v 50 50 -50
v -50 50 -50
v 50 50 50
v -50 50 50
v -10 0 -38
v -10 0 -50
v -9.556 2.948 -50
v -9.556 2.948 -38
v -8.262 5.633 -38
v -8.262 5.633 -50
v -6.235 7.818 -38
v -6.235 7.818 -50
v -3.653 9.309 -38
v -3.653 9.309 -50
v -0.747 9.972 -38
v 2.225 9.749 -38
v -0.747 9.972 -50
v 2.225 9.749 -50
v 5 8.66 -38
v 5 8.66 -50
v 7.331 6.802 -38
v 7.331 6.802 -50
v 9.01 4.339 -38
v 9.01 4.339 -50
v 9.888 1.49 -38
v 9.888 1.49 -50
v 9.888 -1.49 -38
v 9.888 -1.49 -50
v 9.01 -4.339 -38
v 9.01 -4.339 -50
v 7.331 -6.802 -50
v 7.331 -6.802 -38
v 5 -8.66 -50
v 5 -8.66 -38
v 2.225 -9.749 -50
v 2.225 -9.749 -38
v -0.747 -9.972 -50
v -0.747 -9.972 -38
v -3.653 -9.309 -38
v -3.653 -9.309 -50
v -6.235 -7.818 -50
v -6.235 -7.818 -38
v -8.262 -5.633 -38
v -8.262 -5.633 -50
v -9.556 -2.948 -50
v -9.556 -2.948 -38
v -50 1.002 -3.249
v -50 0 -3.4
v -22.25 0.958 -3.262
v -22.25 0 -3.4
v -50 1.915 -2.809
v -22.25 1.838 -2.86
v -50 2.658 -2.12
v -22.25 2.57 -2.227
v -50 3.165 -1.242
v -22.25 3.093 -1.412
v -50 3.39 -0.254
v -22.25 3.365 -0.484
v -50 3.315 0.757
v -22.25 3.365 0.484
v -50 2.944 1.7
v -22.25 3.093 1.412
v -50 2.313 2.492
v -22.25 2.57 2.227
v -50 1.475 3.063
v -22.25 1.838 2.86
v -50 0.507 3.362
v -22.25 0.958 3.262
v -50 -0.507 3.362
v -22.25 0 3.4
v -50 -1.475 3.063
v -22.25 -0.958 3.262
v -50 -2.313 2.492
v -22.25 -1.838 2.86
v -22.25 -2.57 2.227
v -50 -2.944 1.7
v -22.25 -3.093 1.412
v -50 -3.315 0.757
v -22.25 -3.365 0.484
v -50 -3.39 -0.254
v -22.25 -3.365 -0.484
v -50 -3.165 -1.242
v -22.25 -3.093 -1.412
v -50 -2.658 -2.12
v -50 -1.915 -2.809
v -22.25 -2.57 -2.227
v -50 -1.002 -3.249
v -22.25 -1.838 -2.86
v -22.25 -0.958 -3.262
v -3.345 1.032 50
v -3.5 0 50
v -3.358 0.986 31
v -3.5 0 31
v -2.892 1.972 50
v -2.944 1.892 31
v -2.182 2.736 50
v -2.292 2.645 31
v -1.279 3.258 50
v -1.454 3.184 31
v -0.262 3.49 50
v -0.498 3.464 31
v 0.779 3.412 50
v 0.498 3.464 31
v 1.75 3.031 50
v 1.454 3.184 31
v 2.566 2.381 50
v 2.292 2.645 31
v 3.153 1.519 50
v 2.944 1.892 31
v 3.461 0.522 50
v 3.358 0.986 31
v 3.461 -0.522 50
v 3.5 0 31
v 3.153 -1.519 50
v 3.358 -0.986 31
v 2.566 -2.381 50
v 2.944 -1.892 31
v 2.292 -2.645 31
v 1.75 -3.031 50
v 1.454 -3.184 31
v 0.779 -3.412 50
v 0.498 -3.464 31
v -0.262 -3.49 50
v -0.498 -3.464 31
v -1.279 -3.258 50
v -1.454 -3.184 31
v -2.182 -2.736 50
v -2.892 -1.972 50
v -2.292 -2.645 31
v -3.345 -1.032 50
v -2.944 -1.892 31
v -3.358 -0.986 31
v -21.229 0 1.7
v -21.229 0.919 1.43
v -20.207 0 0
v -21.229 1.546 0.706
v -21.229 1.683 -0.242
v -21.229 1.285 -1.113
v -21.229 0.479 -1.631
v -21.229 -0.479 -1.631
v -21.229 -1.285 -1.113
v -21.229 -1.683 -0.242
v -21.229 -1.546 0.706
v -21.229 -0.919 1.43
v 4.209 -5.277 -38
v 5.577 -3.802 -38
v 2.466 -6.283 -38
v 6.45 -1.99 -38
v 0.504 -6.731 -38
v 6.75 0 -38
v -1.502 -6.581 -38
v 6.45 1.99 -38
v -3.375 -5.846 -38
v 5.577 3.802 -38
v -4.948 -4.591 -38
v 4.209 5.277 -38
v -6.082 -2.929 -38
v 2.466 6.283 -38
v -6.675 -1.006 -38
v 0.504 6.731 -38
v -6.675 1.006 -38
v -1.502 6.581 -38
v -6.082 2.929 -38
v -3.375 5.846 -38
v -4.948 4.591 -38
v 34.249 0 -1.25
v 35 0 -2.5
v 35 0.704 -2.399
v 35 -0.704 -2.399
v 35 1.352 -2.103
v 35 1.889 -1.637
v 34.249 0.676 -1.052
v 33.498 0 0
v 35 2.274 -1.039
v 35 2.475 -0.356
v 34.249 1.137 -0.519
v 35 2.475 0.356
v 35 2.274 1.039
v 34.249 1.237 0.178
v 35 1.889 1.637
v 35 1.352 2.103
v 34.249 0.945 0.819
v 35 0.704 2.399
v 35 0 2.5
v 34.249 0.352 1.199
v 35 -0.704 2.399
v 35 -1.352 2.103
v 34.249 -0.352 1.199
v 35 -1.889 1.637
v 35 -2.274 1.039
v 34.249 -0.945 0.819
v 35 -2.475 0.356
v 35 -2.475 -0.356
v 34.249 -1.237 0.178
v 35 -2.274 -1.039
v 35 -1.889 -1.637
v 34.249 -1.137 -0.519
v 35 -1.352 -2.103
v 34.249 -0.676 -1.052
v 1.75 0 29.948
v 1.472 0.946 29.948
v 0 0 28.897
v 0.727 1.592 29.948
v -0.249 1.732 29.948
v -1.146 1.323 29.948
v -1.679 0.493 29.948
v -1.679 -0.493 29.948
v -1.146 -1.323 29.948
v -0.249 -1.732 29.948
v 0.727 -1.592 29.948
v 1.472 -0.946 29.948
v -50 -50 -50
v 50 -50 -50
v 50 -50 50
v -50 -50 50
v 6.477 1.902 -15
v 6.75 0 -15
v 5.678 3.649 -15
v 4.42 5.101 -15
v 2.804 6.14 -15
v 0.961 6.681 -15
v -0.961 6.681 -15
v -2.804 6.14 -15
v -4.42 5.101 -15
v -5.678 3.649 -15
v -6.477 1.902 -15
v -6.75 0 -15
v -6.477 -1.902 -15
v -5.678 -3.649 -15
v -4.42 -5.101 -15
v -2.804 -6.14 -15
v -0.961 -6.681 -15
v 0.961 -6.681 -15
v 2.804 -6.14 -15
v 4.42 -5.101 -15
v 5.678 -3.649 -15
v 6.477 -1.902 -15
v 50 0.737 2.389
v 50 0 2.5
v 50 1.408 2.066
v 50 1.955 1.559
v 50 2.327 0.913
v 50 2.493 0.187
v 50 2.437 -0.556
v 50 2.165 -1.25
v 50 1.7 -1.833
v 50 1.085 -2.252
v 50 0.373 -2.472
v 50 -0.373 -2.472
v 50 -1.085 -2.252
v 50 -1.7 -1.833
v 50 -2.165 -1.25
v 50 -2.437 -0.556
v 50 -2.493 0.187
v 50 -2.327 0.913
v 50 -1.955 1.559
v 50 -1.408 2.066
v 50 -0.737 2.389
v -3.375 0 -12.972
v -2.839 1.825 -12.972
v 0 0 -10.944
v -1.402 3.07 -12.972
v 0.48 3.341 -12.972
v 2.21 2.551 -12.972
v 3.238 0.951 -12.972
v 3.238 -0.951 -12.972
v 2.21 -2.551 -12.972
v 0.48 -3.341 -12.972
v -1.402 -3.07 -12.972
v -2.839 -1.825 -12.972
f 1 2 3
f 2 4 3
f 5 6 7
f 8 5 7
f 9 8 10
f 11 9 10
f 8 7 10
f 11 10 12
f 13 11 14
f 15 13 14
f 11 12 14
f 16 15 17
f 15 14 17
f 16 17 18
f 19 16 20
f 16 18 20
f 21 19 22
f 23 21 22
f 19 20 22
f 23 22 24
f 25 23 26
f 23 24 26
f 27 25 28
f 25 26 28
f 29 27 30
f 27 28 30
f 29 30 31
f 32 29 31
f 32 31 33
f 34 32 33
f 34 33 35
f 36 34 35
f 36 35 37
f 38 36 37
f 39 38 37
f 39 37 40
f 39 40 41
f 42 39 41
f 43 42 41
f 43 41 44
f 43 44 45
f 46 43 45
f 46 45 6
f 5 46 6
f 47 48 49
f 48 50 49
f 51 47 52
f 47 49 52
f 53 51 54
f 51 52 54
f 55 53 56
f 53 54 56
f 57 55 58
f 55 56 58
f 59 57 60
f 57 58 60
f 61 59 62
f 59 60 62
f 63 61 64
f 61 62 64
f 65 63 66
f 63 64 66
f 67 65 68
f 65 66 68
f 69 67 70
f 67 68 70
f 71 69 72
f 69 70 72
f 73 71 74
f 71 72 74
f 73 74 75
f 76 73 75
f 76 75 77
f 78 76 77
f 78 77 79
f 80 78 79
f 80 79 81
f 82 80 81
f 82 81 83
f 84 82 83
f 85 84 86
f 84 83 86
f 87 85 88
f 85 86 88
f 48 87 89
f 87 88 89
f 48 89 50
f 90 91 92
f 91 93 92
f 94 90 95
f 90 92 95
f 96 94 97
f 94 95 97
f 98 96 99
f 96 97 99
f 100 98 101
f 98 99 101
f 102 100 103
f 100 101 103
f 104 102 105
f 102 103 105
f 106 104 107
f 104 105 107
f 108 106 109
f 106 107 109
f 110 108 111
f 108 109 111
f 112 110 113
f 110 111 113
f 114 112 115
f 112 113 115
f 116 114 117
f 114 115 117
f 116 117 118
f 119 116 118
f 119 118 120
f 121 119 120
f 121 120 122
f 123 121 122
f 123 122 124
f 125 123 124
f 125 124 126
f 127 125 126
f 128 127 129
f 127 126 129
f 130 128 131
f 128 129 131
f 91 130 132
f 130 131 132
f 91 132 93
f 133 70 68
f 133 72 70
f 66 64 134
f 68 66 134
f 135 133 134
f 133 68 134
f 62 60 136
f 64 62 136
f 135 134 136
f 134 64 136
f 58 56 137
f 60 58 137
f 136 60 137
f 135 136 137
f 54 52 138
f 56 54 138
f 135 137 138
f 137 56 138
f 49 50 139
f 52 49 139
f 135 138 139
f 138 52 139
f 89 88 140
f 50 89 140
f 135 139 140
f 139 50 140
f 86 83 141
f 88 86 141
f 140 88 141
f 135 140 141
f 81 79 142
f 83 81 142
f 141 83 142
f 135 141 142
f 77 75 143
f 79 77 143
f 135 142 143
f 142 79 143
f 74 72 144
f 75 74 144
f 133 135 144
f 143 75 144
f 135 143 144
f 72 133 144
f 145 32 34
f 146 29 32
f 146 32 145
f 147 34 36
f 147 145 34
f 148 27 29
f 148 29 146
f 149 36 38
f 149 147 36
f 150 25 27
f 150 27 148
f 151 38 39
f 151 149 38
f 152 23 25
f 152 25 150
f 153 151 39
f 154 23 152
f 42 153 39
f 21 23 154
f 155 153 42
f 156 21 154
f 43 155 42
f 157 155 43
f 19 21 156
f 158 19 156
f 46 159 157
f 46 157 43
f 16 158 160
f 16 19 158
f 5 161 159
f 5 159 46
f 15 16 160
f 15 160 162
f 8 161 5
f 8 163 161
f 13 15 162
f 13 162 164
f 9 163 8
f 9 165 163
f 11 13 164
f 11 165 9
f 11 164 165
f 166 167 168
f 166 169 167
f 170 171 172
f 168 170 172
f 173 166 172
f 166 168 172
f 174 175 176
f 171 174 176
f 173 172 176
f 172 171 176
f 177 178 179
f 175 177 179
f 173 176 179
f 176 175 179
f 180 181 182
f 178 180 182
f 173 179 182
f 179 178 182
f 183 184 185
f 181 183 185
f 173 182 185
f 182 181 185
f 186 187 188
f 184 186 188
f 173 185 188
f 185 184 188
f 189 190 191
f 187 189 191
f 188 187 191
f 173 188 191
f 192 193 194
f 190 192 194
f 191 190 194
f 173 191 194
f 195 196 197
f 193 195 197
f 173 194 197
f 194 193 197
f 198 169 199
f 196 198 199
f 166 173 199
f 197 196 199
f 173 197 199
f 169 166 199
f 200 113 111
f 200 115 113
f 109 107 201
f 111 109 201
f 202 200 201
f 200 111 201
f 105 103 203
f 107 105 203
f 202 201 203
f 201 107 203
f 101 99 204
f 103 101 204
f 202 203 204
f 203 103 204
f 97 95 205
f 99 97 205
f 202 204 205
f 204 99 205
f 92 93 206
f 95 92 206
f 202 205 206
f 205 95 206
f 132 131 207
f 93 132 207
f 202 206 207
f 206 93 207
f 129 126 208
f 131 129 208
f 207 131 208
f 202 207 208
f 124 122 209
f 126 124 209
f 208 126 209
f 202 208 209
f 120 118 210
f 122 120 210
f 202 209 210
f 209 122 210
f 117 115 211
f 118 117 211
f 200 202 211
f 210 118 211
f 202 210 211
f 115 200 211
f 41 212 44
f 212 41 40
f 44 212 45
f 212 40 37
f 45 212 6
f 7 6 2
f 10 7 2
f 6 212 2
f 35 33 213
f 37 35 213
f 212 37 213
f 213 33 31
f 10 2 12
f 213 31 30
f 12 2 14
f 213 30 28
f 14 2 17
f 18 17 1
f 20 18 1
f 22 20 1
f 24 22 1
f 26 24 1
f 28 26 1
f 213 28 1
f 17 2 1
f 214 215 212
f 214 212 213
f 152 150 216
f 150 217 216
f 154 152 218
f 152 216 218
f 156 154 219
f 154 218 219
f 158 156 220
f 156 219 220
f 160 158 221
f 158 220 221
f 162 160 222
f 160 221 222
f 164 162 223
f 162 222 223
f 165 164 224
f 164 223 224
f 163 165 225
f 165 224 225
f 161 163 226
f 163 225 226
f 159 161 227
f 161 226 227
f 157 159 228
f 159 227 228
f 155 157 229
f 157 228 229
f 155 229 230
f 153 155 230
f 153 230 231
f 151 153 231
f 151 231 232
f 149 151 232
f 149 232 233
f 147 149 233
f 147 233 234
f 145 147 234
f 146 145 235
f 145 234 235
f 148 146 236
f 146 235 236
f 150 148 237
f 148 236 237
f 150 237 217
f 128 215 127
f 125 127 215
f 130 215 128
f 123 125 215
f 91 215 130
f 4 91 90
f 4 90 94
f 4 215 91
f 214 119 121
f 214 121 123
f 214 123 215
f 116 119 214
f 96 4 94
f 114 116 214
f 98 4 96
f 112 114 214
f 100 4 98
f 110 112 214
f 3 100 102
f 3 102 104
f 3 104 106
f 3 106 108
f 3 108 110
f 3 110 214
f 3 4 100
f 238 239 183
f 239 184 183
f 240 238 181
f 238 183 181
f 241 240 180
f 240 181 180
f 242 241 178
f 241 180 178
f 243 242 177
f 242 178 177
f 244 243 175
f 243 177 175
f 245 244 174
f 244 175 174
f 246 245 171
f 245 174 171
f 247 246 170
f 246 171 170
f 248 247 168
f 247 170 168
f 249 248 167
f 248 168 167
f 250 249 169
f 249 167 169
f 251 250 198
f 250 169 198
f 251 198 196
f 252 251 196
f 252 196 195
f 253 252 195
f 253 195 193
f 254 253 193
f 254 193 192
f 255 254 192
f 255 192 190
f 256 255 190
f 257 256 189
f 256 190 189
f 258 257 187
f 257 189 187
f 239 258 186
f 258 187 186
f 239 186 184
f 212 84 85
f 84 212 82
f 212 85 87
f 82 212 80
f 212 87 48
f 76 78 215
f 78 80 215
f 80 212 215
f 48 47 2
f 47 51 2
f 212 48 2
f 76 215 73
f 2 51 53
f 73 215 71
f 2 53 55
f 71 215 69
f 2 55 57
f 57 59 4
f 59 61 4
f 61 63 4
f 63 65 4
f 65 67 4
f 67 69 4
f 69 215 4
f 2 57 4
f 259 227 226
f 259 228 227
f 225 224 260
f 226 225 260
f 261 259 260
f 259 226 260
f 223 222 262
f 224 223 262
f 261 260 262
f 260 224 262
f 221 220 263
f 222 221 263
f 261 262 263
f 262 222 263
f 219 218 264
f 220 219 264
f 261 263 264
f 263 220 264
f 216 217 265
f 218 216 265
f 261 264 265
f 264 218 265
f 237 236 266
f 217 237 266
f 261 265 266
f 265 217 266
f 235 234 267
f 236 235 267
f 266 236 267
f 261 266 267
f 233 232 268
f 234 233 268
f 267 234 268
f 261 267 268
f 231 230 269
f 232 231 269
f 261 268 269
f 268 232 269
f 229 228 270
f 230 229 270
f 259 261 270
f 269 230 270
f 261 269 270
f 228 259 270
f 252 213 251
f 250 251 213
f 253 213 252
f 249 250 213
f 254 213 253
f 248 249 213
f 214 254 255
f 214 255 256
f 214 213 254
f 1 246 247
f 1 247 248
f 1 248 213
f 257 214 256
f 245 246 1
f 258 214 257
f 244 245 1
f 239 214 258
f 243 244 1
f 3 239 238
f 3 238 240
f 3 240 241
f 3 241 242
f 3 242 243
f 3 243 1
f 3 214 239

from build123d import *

# Parameters (mm, degrees)
SKETCH1_W                       = 100
SKETCH1_H                       = 100
BOSS_EXTRUDE1_DEPTH             = 50
M8X1_25_TAPPED_HOLE1_D          = 6.8
M8X1_25_TAPPED_HOLE1_DEPTH      = 27.75
M8X1_25_TAPPED_HOLE1_TIP        = 2.042926105
M8X1_0_TAPPED_HOLE1_D           = 7
M8X1_0_TAPPED_HOLE1_DEPTH       = 19
M8X1_0_TAPPED_HOLE1_TIP         = 2.103012167
M6X1_0_TAPPED_HOLE1_D           = 5
M6X1_0_TAPPED_HOLE1_DEPTH       = 15
M6X1_0_TAPPED_HOLE1_TIP         = 1.502151548
CBORE_FOR_M12_SHCS1_D           = 13.5
CBORE_FOR_M12_SHCS1_DEPTH       = 35
CBORE_FOR_M12_SHCS1_CBORE_D     = 20
CBORE_FOR_M12_SHCS1_CBORE_DEPTH = 12
CBORE_FOR_M12_SHCS1_TIP         = 4.055809178


with BuildPart() as part:
    # Sketch1 → Boss-Extrude1 (new body, symmetric)
    with BuildSketch(Plane.XY):
        Rectangle(SKETCH1_W, SKETCH1_H)
    extrude(amount=BOSS_EXTRUDE1_DEPTH, both=True)

    # M8x1.25 Tapped Hole1
    with Locations(Plane.ZY.offset(50)):
        with Locations((0, 0)):
            Hole(M8X1_25_TAPPED_HOLE1_D / 2, depth=M8X1_25_TAPPED_HOLE1_DEPTH)
            with Locations((0, 0, -(M8X1_25_TAPPED_HOLE1_DEPTH + M8X1_25_TAPPED_HOLE1_TIP / 2))):  # 118° drill point
                Cone(0, M8X1_25_TAPPED_HOLE1_D / 2, M8X1_25_TAPPED_HOLE1_TIP, mode=Mode.SUBTRACT)

    # M8x1.0 Tapped Hole1
    with Locations(Plane.XY.offset(50)):
        with Locations((0, 0)):
            Hole(M8X1_0_TAPPED_HOLE1_D / 2, depth=M8X1_0_TAPPED_HOLE1_DEPTH)
            with Locations((0, 0, -(M8X1_0_TAPPED_HOLE1_DEPTH + M8X1_0_TAPPED_HOLE1_TIP / 2))):  # 118° drill point
                Cone(0, M8X1_0_TAPPED_HOLE1_D / 2, M8X1_0_TAPPED_HOLE1_TIP, mode=Mode.SUBTRACT)

    # M6x1.0 Tapped Hole1
    with Locations(Plane(origin=(50, 0, 0), x_dir=(0, 0, -1), z_dir=(1, 0, 0))):
        with Locations((0, 0)):
            Hole(M6X1_0_TAPPED_HOLE1_D / 2, depth=M6X1_0_TAPPED_HOLE1_DEPTH)
            with Locations((0, 0, -(M6X1_0_TAPPED_HOLE1_DEPTH + M6X1_0_TAPPED_HOLE1_TIP / 2))):  # 118° drill point
                Cone(0, M6X1_0_TAPPED_HOLE1_D / 2, M6X1_0_TAPPED_HOLE1_TIP, mode=Mode.SUBTRACT)

    # CBORE for M12 SHCS1
    with Locations(Plane(origin=(0, 0, -50), x_dir=(-1, 0, 0), z_dir=(0, 0, -1))):
        with Locations((0, 0)):
            CounterBoreHole(CBORE_FOR_M12_SHCS1_D / 2, CBORE_FOR_M12_SHCS1_CBORE_D / 2, CBORE_FOR_M12_SHCS1_CBORE_DEPTH, depth=CBORE_FOR_M12_SHCS1_DEPTH)
            with Locations((0, 0, -(CBORE_FOR_M12_SHCS1_DEPTH + CBORE_FOR_M12_SHCS1_TIP / 2))):  # 118° drill point
                Cone(0, CBORE_FOR_M12_SHCS1_D / 2, CBORE_FOR_M12_SHCS1_TIP, mode=Mode.SUBTRACT)


solid = part.part
